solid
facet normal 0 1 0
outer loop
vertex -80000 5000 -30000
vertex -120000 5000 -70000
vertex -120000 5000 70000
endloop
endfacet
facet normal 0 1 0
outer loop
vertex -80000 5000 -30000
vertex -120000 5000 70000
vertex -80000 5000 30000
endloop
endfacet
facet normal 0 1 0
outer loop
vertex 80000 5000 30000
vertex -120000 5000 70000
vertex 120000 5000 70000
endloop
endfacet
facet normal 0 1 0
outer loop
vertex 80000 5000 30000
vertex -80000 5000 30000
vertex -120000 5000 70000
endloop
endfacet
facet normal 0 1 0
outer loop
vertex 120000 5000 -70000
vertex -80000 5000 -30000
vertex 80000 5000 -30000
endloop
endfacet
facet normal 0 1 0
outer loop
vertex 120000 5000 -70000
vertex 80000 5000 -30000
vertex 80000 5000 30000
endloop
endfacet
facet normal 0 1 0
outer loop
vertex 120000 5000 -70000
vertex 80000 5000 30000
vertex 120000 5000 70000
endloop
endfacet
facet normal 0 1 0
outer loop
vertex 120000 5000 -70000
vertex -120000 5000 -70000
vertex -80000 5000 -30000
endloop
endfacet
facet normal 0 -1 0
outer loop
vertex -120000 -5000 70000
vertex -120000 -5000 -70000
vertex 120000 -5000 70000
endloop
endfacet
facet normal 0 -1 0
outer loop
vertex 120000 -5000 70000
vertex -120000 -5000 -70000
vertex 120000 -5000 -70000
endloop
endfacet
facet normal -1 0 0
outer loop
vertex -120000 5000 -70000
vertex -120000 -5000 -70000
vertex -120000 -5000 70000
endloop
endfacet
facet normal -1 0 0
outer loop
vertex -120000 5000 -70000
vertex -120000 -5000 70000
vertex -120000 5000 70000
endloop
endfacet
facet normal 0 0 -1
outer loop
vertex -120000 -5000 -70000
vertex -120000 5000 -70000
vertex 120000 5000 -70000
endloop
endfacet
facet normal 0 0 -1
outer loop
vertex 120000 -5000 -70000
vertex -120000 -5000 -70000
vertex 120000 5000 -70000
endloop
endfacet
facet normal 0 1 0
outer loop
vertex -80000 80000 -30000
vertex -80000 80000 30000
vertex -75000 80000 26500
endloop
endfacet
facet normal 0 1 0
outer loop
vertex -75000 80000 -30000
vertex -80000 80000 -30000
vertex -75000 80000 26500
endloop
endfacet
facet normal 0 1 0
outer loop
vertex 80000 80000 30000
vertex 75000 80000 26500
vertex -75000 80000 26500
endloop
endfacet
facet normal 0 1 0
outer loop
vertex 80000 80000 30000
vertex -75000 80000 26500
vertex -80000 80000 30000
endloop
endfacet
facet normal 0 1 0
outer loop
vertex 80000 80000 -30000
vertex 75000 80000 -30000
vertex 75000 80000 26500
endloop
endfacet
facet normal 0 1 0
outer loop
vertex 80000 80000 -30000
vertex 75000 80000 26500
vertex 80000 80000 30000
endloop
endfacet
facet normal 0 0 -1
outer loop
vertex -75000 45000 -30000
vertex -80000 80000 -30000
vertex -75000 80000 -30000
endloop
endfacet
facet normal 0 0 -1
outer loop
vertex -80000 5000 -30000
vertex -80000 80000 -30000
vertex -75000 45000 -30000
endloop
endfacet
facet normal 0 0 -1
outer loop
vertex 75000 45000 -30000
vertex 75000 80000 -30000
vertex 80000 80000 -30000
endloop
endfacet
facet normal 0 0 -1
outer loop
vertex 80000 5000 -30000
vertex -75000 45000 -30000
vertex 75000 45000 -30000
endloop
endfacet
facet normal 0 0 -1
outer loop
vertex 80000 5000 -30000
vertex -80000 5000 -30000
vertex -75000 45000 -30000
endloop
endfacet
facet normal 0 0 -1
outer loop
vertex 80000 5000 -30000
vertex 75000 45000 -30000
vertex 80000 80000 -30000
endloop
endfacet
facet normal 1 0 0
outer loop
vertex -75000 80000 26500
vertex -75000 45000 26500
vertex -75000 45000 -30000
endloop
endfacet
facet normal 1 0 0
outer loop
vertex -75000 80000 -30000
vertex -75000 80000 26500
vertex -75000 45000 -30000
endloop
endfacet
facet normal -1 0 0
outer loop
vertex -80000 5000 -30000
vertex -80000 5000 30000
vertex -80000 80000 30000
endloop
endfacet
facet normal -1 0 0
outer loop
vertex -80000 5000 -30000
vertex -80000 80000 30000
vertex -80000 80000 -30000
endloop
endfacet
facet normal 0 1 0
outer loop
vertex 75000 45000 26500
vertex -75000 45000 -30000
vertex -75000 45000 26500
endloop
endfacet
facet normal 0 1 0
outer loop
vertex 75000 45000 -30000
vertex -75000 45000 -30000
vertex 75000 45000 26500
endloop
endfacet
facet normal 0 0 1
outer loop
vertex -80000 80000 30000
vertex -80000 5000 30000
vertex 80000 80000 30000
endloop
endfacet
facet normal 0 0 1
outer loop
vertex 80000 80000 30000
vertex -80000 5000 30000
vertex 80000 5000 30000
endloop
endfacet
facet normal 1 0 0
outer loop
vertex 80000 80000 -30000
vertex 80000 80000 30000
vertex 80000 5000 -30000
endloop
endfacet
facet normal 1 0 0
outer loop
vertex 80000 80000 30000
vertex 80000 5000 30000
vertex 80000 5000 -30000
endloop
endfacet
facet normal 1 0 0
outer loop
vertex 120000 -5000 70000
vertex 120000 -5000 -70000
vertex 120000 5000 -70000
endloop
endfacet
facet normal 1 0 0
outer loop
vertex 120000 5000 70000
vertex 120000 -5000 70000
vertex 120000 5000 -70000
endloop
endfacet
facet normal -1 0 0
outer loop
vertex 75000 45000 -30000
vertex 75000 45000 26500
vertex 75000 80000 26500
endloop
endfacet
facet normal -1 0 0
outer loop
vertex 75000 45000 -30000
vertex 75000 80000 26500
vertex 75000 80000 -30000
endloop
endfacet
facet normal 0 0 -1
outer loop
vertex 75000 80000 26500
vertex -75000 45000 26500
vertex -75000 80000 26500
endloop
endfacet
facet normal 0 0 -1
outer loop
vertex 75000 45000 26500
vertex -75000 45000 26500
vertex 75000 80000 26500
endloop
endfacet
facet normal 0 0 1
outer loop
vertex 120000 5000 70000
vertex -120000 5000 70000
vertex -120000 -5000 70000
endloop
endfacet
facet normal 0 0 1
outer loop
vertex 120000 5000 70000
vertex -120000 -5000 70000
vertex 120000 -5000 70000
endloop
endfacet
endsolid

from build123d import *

# Parameters (mm, degrees)
BOSS_EXTRUDE1_DEPTH      = 70000
BOSS_EXTRUDE1_DEPTH_BACK = 70000
SKETCH1_W                = 240000
SKETCH1_H                = 10000
SKETCH2_W                = 160000
SKETCH2_H                = 60000
BOSS_EXTRUDE2_DEPTH      = 40000
SKETCH3_W                = 160000
SKETCH3_H                = 3500
BOSS_EXTRUDE3_DEPTH      = 35000
SKETCH4_W                = 5000
SKETCH4_H                = 56500
BOSS_EXTRUDE4_DEPTH      = 35000


with BuildPart() as part:
    # Sketch1 → Boss-Extrude1 (new, two sides: drawn at the far end of the back side and taken through both)
    with BuildSketch(Plane.XY.offset(-BOSS_EXTRUDE1_DEPTH_BACK)):
        Rectangle(SKETCH1_W, SKETCH1_H)
    extrude(amount=BOSS_EXTRUDE1_DEPTH + BOSS_EXTRUDE1_DEPTH_BACK)

    # Sketch2 → Boss-Extrude2 (add)
    with BuildSketch(Plane(origin=(0, 5000, 0), x_dir=(1, 0, 0), z_dir=(0, 1, 0))):
        Rectangle(SKETCH2_W, SKETCH2_H)
    extrude(amount=BOSS_EXTRUDE2_DEPTH)

    # Sketch3 → Boss-Extrude3 (add)
    with BuildSketch(Plane(origin=(0, 45000, 0), x_dir=(1, 0, 0), z_dir=(0, 1, 0))):
        with Locations((0, -28250)):
            Rectangle(SKETCH3_W, SKETCH3_H)
    extrude(amount=BOSS_EXTRUDE3_DEPTH)

    # Sketch4 → Boss-Extrude4 (add)
    with BuildSketch(Plane(origin=(0, 45000, 0), x_dir=(1, 0, 0), z_dir=(0, 1, 0))):
        with Locations((-77500, 1750)):
            Rectangle(SKETCH4_W, SKETCH4_H)
        with Locations((77500, 1750)):
            Rectangle(SKETCH4_W, SKETCH4_H)
    extrude(amount=BOSS_EXTRUDE4_DEPTH)


solid = part.part
